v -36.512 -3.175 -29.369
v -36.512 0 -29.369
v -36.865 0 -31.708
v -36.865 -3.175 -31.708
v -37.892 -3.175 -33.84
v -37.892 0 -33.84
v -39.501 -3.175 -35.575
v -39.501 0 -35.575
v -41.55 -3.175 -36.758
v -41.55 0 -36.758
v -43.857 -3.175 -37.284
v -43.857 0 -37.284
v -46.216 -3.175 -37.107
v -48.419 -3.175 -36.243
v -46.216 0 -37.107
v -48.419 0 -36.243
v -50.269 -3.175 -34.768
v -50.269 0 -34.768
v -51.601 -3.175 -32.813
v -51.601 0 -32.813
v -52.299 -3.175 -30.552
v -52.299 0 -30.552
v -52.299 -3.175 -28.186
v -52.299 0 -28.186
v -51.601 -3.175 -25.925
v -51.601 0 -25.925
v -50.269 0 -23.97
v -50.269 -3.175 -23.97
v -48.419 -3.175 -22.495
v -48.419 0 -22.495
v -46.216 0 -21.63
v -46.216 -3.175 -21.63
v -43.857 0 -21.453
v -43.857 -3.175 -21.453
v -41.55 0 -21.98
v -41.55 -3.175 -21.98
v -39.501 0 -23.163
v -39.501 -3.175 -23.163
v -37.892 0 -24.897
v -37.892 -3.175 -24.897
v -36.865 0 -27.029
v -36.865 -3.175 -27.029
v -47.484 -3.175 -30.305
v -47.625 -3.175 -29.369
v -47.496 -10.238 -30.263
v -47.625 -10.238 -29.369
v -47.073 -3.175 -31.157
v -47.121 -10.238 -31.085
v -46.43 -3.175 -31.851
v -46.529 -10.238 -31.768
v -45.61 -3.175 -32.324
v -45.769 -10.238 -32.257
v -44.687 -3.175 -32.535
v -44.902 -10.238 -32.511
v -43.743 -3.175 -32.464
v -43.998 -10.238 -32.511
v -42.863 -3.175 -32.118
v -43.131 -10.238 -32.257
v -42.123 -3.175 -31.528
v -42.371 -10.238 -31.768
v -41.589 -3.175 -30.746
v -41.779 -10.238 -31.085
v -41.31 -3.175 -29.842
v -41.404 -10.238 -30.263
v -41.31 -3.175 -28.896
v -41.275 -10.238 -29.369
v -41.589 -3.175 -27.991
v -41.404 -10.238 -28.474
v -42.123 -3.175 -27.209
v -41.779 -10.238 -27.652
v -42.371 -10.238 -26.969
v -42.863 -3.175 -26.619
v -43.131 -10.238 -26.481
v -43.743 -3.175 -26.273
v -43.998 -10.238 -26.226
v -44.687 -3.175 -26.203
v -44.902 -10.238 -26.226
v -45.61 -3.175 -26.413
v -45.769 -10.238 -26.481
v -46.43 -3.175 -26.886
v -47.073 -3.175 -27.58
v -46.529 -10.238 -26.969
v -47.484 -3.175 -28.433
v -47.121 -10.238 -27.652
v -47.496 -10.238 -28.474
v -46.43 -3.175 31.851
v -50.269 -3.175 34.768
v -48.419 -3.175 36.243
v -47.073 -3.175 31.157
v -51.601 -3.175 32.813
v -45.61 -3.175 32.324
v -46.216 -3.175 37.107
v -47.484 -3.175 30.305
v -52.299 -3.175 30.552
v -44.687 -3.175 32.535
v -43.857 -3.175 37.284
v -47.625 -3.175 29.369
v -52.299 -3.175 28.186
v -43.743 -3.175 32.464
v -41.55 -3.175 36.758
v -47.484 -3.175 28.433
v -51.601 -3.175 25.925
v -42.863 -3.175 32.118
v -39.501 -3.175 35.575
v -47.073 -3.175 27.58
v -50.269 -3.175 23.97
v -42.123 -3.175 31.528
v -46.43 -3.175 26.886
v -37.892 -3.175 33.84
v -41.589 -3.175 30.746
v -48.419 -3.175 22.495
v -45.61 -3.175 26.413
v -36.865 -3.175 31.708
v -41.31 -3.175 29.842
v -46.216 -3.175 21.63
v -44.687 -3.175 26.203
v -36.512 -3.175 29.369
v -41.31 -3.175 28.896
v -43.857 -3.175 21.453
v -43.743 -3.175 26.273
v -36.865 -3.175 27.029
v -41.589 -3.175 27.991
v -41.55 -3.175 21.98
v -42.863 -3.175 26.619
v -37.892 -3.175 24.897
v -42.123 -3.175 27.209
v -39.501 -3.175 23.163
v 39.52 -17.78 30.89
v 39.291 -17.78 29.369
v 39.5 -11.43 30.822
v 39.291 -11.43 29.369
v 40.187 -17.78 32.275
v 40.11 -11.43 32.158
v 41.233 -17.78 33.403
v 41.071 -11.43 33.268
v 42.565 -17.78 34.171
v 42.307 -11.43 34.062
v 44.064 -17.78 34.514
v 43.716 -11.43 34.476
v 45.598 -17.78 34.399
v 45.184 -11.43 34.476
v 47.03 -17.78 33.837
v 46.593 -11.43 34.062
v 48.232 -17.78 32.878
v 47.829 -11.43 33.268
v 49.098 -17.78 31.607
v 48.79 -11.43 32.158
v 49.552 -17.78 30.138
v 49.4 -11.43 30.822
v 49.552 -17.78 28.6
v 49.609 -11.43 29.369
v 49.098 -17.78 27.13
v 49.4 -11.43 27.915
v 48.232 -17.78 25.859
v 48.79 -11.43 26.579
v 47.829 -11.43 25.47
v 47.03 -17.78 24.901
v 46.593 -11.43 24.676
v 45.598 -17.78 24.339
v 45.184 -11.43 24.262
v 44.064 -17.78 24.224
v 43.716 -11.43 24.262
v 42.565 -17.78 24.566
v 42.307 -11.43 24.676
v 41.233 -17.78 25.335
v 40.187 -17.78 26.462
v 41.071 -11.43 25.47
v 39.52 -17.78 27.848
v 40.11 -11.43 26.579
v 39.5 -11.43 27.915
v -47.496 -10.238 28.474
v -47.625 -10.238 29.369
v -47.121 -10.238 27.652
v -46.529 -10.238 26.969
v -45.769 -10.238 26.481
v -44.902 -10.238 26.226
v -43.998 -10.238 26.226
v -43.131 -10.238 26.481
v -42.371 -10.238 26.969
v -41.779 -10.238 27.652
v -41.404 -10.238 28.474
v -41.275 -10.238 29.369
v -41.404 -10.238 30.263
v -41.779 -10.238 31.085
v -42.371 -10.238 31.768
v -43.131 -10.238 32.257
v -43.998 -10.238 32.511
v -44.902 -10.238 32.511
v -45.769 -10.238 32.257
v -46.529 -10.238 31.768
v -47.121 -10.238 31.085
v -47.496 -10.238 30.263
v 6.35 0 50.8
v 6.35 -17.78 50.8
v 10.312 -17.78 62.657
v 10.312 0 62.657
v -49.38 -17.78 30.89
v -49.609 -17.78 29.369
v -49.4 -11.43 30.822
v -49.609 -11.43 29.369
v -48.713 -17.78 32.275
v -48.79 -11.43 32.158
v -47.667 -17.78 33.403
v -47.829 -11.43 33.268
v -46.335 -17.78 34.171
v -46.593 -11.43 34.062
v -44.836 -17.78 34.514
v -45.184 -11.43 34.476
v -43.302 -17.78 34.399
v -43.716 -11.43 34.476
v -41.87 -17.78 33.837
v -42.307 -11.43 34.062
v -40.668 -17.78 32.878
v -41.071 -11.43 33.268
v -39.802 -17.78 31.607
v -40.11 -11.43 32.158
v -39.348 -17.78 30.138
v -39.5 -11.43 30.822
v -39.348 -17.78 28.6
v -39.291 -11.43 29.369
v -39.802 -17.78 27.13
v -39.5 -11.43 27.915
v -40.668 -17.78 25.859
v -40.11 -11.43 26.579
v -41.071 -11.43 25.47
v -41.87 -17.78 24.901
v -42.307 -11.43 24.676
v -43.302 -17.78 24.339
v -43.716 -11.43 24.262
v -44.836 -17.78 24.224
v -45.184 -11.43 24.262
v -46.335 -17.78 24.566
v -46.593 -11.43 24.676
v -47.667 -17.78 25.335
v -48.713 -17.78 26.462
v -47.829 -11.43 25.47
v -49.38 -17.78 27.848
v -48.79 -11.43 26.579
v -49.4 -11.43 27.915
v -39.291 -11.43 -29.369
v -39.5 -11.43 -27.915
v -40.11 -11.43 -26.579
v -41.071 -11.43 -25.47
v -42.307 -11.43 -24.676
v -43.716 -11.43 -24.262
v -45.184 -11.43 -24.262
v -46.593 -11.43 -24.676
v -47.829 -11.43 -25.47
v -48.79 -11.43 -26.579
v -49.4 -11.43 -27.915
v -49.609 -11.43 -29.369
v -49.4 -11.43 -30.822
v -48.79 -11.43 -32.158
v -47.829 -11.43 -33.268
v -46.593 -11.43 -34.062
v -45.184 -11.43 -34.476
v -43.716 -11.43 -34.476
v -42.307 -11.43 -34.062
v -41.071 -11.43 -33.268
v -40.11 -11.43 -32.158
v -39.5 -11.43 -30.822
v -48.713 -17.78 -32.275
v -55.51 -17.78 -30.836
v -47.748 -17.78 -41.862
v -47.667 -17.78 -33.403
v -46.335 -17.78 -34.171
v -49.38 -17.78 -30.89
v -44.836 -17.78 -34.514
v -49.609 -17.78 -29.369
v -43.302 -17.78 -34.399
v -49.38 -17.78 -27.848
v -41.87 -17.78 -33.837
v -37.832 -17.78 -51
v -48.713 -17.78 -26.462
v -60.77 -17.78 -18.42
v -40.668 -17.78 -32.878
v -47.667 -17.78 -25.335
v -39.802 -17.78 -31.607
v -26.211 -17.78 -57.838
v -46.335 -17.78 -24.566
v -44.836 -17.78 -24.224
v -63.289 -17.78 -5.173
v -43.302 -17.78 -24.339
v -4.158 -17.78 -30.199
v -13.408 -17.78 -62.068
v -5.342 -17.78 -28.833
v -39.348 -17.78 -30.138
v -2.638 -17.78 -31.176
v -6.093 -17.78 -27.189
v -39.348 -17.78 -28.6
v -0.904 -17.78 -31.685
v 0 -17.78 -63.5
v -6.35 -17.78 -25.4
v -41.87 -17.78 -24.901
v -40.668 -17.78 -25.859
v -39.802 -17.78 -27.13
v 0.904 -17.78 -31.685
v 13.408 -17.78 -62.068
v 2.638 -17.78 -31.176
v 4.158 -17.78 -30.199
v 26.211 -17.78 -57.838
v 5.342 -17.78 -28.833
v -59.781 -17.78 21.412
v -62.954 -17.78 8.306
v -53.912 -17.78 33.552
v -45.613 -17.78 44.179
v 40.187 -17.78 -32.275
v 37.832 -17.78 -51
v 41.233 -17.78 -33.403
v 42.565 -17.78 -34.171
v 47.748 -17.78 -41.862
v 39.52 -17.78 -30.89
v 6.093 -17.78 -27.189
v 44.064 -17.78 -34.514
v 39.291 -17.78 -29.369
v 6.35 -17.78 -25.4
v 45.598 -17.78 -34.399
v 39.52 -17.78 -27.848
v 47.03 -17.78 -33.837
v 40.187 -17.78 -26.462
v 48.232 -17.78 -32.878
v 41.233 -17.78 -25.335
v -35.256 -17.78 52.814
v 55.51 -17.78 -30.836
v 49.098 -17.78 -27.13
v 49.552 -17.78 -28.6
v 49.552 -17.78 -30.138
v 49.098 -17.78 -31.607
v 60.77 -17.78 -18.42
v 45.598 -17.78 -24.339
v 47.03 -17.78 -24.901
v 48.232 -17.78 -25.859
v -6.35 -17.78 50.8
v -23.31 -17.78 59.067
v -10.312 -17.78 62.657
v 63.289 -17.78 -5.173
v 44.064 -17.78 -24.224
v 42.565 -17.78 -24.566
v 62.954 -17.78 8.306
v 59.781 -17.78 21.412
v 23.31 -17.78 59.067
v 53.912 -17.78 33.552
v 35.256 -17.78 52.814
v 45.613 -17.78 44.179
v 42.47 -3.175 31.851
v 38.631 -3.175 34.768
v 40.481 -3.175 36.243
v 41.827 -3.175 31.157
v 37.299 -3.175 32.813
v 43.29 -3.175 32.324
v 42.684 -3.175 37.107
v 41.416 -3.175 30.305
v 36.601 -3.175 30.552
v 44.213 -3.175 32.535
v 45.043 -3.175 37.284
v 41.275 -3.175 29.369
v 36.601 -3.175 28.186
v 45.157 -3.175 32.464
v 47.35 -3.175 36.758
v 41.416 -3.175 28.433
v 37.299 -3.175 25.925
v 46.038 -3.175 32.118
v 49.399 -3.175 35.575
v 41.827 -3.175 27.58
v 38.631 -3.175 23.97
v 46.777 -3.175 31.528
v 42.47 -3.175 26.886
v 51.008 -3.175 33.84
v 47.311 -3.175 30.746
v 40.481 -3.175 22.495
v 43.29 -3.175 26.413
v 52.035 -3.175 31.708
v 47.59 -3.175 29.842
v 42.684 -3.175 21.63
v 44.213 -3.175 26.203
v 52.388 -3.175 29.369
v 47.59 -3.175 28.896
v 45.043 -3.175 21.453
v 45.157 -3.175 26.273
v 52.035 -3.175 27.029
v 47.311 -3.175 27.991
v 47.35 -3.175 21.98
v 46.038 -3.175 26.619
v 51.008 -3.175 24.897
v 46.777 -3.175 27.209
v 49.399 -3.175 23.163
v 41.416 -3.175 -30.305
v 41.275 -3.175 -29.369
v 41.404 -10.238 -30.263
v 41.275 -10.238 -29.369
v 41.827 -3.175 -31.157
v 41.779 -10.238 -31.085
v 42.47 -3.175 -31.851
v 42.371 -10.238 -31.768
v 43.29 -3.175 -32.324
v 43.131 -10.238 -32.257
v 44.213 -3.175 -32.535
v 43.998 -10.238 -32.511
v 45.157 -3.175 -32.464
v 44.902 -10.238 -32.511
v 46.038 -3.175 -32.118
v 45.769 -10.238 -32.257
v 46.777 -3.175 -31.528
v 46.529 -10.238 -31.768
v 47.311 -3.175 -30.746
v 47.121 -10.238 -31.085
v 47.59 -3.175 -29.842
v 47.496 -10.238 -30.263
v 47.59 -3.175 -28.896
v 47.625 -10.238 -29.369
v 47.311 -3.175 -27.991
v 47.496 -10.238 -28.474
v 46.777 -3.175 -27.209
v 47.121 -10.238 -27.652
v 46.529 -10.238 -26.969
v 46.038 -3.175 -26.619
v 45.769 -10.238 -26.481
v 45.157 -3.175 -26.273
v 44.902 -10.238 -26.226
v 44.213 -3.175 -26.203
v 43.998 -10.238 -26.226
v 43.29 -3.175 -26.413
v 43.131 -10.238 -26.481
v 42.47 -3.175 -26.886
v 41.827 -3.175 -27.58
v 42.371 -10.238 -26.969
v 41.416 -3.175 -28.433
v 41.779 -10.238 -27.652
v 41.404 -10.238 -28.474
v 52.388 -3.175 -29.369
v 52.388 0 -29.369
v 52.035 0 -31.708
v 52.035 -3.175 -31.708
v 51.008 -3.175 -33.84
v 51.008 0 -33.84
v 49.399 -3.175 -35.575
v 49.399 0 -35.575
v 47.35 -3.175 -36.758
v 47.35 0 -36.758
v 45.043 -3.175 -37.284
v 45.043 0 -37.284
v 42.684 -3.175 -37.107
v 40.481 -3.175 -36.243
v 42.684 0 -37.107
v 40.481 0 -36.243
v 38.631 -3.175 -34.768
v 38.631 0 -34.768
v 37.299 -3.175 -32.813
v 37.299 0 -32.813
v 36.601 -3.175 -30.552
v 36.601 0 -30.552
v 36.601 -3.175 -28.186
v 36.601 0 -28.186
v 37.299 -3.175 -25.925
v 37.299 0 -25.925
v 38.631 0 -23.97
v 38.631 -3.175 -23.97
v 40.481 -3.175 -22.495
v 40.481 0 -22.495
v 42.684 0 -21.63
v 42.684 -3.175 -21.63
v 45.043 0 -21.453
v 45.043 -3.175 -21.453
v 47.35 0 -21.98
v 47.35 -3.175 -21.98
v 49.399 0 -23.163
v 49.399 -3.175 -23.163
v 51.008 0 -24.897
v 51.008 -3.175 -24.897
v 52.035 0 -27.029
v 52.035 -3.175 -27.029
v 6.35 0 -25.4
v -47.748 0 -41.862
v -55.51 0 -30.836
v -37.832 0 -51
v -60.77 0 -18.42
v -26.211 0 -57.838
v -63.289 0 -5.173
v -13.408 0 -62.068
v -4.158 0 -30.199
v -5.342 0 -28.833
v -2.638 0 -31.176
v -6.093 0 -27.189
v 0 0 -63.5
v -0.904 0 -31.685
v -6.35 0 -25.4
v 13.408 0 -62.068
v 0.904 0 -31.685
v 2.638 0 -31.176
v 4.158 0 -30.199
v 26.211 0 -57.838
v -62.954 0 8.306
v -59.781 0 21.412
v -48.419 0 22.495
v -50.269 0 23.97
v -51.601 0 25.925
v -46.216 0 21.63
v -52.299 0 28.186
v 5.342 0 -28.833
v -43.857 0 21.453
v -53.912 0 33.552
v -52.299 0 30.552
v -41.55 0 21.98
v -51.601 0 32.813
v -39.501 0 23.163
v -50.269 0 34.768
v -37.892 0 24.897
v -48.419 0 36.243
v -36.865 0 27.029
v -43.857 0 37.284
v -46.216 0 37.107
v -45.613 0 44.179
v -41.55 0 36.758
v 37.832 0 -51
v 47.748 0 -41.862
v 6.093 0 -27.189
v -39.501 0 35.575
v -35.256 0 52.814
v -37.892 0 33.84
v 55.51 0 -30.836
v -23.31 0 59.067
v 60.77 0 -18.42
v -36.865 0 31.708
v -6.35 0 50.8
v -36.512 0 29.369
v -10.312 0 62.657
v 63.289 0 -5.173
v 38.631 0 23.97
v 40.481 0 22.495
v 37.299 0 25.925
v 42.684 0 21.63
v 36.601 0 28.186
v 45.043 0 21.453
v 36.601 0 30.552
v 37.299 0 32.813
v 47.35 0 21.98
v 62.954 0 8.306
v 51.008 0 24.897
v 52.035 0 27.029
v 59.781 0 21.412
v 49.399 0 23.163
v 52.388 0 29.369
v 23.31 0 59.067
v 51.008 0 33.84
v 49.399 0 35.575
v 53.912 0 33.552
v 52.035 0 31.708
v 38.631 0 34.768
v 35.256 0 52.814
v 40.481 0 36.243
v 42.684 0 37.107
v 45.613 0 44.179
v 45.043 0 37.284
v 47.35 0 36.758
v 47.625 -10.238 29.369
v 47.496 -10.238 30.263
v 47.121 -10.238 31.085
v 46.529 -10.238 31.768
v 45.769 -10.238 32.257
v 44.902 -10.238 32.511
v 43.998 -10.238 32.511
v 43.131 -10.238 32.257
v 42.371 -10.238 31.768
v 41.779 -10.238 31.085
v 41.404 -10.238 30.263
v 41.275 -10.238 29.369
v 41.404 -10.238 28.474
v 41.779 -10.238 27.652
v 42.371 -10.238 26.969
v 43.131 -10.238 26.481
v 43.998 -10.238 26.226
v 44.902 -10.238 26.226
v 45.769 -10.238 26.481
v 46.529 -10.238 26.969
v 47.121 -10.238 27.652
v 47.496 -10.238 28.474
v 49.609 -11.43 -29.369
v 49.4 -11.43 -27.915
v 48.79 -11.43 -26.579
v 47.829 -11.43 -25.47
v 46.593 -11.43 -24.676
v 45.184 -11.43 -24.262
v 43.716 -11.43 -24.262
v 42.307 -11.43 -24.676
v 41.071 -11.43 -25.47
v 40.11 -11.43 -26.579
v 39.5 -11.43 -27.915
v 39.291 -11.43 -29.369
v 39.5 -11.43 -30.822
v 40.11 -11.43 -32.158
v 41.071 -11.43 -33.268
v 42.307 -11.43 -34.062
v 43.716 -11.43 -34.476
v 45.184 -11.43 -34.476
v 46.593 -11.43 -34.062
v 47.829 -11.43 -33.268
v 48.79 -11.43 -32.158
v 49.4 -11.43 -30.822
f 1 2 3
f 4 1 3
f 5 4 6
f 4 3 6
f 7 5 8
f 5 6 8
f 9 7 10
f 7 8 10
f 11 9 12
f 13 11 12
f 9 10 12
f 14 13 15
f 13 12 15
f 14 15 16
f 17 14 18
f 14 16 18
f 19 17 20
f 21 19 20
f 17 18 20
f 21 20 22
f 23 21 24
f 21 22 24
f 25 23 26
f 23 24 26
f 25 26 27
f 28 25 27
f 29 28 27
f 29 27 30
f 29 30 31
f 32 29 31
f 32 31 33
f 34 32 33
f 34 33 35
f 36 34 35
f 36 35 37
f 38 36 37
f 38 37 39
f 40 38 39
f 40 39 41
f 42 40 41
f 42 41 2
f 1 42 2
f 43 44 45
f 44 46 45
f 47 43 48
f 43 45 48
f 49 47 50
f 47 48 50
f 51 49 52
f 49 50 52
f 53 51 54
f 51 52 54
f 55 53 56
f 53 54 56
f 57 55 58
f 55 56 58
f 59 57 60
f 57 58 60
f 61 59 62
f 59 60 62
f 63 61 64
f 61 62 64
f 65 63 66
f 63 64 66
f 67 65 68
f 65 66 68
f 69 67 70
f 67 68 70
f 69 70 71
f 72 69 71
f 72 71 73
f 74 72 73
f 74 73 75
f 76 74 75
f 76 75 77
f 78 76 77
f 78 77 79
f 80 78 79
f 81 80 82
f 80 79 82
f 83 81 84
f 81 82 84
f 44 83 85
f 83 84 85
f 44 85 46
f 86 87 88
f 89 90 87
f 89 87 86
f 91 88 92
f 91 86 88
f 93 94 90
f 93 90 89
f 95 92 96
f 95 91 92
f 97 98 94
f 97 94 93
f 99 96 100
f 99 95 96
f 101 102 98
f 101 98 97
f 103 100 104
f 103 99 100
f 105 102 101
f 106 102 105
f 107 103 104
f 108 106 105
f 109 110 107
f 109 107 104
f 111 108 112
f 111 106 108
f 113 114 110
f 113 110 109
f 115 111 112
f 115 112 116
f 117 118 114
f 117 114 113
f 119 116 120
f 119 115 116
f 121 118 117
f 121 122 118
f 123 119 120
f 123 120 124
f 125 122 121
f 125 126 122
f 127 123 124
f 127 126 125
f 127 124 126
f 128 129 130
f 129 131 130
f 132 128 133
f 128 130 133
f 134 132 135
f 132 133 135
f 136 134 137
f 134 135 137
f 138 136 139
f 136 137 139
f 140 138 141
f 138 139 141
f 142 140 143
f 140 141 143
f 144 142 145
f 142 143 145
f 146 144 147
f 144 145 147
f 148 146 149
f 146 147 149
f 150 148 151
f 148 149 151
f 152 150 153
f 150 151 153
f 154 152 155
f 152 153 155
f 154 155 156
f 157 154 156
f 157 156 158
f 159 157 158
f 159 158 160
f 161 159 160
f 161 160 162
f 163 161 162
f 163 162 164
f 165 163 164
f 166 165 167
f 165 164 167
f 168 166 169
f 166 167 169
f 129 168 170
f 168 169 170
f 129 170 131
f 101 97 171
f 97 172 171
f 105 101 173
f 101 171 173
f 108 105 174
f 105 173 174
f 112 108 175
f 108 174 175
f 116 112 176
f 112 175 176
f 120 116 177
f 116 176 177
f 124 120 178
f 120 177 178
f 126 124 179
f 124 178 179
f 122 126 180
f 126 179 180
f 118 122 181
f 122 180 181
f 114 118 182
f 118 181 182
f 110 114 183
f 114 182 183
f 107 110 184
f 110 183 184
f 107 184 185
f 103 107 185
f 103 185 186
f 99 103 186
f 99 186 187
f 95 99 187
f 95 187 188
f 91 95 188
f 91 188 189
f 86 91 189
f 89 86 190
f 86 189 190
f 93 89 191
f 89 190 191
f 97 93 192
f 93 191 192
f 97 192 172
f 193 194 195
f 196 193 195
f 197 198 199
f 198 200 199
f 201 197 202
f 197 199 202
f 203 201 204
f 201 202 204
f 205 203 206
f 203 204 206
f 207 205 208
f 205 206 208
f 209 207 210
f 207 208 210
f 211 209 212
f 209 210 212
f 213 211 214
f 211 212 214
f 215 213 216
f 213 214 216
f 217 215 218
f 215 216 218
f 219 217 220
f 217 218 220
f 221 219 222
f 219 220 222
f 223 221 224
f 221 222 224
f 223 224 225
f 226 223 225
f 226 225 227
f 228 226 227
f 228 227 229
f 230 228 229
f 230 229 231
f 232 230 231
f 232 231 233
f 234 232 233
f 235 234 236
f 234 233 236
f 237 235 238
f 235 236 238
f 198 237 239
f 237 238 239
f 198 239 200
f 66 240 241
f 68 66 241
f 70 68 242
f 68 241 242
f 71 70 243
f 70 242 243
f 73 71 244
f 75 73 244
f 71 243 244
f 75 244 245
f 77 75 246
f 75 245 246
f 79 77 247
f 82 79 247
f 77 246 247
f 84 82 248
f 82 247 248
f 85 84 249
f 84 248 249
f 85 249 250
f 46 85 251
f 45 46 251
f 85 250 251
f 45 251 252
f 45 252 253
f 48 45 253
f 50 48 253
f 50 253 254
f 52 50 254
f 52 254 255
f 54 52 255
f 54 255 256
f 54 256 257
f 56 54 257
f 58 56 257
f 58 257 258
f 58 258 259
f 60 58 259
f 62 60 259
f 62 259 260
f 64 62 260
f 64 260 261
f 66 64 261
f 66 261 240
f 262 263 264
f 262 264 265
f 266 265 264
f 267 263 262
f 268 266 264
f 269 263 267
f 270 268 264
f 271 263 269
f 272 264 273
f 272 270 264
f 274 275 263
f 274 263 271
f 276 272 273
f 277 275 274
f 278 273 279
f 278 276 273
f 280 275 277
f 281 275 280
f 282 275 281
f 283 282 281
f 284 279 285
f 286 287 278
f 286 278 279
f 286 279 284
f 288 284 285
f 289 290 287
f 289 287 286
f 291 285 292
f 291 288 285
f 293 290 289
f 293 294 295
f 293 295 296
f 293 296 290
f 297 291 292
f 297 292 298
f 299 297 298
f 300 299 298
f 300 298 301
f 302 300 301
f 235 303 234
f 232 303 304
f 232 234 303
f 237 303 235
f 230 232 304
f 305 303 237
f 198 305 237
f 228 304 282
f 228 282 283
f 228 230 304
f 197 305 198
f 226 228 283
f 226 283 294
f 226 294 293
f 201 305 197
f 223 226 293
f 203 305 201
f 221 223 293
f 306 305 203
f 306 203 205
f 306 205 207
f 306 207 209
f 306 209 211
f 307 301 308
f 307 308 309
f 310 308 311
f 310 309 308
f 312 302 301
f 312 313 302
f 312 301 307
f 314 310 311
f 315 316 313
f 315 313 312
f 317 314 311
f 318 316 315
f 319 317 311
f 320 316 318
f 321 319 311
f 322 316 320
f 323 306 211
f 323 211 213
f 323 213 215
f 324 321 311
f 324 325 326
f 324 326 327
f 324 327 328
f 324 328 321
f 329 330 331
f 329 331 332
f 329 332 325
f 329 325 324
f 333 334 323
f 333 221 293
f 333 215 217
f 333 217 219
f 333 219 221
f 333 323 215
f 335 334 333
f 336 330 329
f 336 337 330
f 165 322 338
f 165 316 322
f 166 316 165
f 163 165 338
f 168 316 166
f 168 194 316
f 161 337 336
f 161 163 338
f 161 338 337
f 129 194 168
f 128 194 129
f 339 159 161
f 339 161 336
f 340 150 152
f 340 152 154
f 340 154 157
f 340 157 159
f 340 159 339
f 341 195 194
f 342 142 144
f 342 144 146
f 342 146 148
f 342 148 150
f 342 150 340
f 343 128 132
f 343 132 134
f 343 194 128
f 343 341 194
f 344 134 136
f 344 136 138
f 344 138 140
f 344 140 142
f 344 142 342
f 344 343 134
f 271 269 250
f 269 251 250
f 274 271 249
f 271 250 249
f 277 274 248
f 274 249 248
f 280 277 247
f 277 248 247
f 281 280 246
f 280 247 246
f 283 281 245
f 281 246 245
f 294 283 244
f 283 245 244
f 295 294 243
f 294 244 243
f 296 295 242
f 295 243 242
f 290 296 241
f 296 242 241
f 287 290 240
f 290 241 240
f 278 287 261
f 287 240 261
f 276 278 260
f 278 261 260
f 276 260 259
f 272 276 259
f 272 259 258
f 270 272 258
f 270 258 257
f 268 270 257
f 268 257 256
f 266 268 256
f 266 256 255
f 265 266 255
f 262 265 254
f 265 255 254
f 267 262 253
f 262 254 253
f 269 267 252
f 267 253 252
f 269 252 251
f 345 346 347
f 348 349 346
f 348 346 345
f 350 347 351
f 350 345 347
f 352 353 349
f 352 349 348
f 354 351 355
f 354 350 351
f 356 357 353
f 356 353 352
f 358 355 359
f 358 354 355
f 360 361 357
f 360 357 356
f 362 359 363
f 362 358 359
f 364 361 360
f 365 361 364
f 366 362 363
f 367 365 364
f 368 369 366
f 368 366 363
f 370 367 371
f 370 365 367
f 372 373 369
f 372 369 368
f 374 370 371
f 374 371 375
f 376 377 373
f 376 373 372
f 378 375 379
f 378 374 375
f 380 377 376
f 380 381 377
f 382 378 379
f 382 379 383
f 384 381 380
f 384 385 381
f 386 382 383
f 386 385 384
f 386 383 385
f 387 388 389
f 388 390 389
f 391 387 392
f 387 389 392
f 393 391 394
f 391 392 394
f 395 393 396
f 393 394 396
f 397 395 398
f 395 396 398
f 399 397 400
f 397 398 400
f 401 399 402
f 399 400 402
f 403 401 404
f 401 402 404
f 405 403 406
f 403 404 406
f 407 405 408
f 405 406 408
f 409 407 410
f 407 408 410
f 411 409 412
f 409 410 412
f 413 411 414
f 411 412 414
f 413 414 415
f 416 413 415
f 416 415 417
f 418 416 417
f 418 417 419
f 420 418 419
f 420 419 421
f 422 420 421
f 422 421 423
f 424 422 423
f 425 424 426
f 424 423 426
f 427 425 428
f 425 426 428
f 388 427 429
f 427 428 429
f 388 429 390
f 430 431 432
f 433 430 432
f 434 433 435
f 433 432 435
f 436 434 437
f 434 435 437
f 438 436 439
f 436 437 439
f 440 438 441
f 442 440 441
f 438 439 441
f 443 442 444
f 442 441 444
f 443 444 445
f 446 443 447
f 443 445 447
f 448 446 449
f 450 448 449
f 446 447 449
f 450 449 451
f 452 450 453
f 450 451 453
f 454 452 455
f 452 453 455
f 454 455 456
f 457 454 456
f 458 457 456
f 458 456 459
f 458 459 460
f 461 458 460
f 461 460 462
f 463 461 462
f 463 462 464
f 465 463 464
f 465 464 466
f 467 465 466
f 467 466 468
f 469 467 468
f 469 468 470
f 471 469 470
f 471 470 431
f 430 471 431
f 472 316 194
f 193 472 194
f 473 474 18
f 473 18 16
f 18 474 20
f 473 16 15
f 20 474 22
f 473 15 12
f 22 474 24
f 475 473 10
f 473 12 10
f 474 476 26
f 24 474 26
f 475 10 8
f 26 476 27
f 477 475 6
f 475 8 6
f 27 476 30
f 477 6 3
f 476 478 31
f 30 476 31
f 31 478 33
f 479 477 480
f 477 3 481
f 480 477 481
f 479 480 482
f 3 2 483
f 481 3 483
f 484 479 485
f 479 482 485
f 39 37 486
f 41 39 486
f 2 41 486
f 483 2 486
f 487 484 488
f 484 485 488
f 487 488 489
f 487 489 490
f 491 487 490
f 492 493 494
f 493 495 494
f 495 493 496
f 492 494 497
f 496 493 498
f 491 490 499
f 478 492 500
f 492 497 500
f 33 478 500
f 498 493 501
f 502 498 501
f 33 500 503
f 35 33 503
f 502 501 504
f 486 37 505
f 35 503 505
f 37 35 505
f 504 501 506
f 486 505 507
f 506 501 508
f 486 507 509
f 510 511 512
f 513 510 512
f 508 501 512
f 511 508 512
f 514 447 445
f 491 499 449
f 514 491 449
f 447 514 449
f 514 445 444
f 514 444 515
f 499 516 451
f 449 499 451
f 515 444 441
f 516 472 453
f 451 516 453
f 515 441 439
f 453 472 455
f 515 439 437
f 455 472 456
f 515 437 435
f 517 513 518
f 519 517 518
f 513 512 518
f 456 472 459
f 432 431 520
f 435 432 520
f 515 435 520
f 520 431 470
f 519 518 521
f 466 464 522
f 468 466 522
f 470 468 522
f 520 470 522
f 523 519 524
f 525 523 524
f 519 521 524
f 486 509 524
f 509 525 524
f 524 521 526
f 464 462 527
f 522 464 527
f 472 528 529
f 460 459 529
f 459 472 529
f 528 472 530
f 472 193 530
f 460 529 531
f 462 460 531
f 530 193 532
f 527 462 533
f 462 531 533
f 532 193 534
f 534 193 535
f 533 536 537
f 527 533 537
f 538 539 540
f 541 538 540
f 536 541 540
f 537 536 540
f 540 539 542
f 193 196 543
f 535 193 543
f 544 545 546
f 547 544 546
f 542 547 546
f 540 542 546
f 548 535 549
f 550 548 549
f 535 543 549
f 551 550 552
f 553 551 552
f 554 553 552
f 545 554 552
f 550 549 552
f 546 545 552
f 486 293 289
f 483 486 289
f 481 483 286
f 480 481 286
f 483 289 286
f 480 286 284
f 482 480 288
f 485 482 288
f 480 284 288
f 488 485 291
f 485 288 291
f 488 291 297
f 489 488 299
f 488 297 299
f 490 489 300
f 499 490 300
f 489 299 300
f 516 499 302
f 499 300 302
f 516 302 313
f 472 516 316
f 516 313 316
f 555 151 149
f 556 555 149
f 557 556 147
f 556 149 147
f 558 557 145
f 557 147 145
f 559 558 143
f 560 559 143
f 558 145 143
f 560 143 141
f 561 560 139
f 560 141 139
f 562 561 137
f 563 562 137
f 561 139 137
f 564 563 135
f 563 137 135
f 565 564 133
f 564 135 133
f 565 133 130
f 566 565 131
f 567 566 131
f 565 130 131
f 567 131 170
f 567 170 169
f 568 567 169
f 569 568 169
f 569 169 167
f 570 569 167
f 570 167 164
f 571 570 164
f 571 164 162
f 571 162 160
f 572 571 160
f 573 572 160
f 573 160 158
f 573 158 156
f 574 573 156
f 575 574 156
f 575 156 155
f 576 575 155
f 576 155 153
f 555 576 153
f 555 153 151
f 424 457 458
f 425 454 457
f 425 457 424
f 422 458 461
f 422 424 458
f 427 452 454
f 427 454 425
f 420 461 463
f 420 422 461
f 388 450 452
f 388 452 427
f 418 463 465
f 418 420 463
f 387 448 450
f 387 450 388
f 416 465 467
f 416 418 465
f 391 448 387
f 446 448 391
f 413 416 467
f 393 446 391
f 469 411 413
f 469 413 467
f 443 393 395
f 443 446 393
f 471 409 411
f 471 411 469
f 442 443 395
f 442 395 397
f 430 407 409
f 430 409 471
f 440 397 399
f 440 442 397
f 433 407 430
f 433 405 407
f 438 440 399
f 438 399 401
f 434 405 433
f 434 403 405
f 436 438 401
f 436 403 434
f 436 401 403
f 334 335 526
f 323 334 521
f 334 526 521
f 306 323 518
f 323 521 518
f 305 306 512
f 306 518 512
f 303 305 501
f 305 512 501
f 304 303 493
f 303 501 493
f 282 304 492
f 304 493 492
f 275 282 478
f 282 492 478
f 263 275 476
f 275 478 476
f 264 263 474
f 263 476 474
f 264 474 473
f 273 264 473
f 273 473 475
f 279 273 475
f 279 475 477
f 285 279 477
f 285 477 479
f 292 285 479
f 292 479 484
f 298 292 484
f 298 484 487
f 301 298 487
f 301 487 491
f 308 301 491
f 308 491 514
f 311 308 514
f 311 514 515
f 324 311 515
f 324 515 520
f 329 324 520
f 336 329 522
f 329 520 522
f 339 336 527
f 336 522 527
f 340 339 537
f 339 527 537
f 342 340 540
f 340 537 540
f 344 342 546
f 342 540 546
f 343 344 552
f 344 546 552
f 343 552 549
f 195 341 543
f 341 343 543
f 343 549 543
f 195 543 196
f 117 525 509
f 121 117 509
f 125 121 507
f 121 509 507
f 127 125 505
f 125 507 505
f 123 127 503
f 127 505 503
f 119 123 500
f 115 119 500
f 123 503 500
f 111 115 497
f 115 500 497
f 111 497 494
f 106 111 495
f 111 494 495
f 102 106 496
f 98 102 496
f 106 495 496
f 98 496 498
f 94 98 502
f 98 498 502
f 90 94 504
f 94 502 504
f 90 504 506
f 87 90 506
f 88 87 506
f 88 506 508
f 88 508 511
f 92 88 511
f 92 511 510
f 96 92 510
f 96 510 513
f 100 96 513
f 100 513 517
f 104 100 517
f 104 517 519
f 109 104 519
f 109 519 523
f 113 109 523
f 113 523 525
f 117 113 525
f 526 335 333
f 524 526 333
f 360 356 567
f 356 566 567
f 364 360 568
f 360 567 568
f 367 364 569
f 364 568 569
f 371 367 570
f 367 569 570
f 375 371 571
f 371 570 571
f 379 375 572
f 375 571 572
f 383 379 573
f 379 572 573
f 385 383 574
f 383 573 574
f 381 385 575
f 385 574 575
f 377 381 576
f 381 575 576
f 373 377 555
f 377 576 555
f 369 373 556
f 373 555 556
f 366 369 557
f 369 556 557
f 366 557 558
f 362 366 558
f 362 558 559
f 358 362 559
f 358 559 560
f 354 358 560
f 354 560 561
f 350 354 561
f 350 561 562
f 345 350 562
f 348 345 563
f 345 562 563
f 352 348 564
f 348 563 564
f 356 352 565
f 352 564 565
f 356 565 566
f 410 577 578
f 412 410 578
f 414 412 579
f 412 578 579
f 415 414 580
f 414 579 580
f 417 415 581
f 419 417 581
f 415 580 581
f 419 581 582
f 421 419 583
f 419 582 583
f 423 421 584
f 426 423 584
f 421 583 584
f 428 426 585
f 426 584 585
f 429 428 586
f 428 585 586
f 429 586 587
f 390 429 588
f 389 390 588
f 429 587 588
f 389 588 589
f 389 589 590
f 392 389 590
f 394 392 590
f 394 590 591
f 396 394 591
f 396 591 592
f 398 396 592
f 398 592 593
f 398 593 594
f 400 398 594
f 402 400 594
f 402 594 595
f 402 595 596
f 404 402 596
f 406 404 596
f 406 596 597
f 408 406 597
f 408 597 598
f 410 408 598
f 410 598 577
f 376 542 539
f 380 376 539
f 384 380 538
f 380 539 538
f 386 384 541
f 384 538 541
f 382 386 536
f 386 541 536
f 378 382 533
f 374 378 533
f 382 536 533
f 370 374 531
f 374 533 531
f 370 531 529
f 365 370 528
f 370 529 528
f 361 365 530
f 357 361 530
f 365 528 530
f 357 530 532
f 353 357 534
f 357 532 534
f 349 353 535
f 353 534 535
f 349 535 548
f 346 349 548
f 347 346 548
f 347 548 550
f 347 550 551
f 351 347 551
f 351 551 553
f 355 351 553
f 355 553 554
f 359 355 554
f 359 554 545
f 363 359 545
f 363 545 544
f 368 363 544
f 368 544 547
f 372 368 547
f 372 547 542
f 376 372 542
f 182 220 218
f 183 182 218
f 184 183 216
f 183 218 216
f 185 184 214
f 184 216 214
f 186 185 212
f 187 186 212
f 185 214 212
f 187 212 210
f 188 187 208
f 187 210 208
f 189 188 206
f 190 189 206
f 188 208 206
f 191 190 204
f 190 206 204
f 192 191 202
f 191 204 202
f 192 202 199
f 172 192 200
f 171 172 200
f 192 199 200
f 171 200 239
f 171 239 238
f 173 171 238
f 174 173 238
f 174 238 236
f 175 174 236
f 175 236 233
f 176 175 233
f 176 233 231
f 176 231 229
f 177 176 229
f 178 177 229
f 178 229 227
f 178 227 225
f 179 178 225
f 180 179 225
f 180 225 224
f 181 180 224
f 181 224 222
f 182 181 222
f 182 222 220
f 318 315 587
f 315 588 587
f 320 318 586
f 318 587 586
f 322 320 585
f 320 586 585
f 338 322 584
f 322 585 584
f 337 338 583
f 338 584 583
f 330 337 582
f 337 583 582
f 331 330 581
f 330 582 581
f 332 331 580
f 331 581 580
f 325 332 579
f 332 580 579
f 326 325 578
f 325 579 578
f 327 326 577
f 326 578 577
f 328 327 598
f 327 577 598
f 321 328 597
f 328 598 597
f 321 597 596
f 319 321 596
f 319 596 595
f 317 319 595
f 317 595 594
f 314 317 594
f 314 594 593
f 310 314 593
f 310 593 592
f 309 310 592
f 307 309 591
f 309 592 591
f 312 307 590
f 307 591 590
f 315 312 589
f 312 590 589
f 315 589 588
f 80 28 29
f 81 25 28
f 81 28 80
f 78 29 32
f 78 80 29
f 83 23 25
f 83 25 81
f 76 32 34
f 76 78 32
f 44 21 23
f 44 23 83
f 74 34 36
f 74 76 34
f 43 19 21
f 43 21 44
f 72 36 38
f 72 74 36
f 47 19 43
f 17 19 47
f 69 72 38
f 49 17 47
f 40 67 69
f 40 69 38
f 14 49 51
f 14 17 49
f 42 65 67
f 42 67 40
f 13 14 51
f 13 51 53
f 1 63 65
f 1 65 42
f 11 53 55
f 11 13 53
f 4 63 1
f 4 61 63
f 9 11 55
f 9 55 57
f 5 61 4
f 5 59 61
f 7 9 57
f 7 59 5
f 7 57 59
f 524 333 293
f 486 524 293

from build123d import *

# Parameters (mm, degrees)
F0_R           = 63.5
F1_DEPTH       = 17.78
F2_D           = 6.35
F2_CBORE_D     = 15.875
F2_CBORE_DEPTH = 3.175
F4_D           = 10.31875
F4_DEPTH       = 6.35
F4_TIP         = 3.1000652563
F6_DEPTH       = 25.4


# Not quite as in the source:
# - a length typed as a fraction of an inch, garbled in the dataset ("3 / 203.2 mm" for 3/8 in), is restored
# - a feature names something its author has since deleted; it is built from what else it names


with BuildPart() as f1:
    # F0 (on Front) → F1 (new body)
    with BuildSketch(Plane.XZ):
        Circle(F0_R)
    extrude(amount=F1_DEPTH)

    # F2 (through all)
    with Locations(Plane(origin=(0, 0, 0), x_dir=(1, 0, 0), z_dir=(0, 1, 0))):
        with Locations((44.45, -29.36875), (-44.45, -29.36875), (-44.45, 29.36875), (44.45, 29.36875)):
            CounterBoreHole(F2_D / 2, F2_CBORE_D / 2, F2_CBORE_DEPTH)

    # F4
    with Locations(Plane.XZ.offset(17.78)):
        with Locations((-44.45, 29.36875), (44.45, 29.36875), (44.45, -29.36875), (-44.45, -29.36875)):
            Hole(F4_D / 2, depth=F4_DEPTH)
            with Locations((0, 0, -(F4_DEPTH + F4_TIP / 2))):  # 118° drill point
                Cone(0, F4_D / 2, F4_TIP, mode=Mode.SUBTRACT)

    # F5 (on face) → F6 (cut)
    with BuildSketch(Plane.XZ.offset(17.78)):
        with BuildLine():
            Line((-10.3124, 62.6570379625), (-6.35, 50.8))
            Line((-6.35, 50.8), (-6.35, -25.4))
            ThreePointArc((-6.35, -25.4), (0, -31.75), (6.35, -25.4))
            Line((6.35, -25.4), (6.35, 50.8))
            Line((6.35, 50.8), (10.3124, 62.6570379625))
            ThreePointArc((10.3124, 62.6570379625), (0, 63.5), (-10.3124, 62.6570379625))
        make_face()
    extrude(amount=-F6_DEPTH, mode=Mode.SUBTRACT)


solid = f1.part
